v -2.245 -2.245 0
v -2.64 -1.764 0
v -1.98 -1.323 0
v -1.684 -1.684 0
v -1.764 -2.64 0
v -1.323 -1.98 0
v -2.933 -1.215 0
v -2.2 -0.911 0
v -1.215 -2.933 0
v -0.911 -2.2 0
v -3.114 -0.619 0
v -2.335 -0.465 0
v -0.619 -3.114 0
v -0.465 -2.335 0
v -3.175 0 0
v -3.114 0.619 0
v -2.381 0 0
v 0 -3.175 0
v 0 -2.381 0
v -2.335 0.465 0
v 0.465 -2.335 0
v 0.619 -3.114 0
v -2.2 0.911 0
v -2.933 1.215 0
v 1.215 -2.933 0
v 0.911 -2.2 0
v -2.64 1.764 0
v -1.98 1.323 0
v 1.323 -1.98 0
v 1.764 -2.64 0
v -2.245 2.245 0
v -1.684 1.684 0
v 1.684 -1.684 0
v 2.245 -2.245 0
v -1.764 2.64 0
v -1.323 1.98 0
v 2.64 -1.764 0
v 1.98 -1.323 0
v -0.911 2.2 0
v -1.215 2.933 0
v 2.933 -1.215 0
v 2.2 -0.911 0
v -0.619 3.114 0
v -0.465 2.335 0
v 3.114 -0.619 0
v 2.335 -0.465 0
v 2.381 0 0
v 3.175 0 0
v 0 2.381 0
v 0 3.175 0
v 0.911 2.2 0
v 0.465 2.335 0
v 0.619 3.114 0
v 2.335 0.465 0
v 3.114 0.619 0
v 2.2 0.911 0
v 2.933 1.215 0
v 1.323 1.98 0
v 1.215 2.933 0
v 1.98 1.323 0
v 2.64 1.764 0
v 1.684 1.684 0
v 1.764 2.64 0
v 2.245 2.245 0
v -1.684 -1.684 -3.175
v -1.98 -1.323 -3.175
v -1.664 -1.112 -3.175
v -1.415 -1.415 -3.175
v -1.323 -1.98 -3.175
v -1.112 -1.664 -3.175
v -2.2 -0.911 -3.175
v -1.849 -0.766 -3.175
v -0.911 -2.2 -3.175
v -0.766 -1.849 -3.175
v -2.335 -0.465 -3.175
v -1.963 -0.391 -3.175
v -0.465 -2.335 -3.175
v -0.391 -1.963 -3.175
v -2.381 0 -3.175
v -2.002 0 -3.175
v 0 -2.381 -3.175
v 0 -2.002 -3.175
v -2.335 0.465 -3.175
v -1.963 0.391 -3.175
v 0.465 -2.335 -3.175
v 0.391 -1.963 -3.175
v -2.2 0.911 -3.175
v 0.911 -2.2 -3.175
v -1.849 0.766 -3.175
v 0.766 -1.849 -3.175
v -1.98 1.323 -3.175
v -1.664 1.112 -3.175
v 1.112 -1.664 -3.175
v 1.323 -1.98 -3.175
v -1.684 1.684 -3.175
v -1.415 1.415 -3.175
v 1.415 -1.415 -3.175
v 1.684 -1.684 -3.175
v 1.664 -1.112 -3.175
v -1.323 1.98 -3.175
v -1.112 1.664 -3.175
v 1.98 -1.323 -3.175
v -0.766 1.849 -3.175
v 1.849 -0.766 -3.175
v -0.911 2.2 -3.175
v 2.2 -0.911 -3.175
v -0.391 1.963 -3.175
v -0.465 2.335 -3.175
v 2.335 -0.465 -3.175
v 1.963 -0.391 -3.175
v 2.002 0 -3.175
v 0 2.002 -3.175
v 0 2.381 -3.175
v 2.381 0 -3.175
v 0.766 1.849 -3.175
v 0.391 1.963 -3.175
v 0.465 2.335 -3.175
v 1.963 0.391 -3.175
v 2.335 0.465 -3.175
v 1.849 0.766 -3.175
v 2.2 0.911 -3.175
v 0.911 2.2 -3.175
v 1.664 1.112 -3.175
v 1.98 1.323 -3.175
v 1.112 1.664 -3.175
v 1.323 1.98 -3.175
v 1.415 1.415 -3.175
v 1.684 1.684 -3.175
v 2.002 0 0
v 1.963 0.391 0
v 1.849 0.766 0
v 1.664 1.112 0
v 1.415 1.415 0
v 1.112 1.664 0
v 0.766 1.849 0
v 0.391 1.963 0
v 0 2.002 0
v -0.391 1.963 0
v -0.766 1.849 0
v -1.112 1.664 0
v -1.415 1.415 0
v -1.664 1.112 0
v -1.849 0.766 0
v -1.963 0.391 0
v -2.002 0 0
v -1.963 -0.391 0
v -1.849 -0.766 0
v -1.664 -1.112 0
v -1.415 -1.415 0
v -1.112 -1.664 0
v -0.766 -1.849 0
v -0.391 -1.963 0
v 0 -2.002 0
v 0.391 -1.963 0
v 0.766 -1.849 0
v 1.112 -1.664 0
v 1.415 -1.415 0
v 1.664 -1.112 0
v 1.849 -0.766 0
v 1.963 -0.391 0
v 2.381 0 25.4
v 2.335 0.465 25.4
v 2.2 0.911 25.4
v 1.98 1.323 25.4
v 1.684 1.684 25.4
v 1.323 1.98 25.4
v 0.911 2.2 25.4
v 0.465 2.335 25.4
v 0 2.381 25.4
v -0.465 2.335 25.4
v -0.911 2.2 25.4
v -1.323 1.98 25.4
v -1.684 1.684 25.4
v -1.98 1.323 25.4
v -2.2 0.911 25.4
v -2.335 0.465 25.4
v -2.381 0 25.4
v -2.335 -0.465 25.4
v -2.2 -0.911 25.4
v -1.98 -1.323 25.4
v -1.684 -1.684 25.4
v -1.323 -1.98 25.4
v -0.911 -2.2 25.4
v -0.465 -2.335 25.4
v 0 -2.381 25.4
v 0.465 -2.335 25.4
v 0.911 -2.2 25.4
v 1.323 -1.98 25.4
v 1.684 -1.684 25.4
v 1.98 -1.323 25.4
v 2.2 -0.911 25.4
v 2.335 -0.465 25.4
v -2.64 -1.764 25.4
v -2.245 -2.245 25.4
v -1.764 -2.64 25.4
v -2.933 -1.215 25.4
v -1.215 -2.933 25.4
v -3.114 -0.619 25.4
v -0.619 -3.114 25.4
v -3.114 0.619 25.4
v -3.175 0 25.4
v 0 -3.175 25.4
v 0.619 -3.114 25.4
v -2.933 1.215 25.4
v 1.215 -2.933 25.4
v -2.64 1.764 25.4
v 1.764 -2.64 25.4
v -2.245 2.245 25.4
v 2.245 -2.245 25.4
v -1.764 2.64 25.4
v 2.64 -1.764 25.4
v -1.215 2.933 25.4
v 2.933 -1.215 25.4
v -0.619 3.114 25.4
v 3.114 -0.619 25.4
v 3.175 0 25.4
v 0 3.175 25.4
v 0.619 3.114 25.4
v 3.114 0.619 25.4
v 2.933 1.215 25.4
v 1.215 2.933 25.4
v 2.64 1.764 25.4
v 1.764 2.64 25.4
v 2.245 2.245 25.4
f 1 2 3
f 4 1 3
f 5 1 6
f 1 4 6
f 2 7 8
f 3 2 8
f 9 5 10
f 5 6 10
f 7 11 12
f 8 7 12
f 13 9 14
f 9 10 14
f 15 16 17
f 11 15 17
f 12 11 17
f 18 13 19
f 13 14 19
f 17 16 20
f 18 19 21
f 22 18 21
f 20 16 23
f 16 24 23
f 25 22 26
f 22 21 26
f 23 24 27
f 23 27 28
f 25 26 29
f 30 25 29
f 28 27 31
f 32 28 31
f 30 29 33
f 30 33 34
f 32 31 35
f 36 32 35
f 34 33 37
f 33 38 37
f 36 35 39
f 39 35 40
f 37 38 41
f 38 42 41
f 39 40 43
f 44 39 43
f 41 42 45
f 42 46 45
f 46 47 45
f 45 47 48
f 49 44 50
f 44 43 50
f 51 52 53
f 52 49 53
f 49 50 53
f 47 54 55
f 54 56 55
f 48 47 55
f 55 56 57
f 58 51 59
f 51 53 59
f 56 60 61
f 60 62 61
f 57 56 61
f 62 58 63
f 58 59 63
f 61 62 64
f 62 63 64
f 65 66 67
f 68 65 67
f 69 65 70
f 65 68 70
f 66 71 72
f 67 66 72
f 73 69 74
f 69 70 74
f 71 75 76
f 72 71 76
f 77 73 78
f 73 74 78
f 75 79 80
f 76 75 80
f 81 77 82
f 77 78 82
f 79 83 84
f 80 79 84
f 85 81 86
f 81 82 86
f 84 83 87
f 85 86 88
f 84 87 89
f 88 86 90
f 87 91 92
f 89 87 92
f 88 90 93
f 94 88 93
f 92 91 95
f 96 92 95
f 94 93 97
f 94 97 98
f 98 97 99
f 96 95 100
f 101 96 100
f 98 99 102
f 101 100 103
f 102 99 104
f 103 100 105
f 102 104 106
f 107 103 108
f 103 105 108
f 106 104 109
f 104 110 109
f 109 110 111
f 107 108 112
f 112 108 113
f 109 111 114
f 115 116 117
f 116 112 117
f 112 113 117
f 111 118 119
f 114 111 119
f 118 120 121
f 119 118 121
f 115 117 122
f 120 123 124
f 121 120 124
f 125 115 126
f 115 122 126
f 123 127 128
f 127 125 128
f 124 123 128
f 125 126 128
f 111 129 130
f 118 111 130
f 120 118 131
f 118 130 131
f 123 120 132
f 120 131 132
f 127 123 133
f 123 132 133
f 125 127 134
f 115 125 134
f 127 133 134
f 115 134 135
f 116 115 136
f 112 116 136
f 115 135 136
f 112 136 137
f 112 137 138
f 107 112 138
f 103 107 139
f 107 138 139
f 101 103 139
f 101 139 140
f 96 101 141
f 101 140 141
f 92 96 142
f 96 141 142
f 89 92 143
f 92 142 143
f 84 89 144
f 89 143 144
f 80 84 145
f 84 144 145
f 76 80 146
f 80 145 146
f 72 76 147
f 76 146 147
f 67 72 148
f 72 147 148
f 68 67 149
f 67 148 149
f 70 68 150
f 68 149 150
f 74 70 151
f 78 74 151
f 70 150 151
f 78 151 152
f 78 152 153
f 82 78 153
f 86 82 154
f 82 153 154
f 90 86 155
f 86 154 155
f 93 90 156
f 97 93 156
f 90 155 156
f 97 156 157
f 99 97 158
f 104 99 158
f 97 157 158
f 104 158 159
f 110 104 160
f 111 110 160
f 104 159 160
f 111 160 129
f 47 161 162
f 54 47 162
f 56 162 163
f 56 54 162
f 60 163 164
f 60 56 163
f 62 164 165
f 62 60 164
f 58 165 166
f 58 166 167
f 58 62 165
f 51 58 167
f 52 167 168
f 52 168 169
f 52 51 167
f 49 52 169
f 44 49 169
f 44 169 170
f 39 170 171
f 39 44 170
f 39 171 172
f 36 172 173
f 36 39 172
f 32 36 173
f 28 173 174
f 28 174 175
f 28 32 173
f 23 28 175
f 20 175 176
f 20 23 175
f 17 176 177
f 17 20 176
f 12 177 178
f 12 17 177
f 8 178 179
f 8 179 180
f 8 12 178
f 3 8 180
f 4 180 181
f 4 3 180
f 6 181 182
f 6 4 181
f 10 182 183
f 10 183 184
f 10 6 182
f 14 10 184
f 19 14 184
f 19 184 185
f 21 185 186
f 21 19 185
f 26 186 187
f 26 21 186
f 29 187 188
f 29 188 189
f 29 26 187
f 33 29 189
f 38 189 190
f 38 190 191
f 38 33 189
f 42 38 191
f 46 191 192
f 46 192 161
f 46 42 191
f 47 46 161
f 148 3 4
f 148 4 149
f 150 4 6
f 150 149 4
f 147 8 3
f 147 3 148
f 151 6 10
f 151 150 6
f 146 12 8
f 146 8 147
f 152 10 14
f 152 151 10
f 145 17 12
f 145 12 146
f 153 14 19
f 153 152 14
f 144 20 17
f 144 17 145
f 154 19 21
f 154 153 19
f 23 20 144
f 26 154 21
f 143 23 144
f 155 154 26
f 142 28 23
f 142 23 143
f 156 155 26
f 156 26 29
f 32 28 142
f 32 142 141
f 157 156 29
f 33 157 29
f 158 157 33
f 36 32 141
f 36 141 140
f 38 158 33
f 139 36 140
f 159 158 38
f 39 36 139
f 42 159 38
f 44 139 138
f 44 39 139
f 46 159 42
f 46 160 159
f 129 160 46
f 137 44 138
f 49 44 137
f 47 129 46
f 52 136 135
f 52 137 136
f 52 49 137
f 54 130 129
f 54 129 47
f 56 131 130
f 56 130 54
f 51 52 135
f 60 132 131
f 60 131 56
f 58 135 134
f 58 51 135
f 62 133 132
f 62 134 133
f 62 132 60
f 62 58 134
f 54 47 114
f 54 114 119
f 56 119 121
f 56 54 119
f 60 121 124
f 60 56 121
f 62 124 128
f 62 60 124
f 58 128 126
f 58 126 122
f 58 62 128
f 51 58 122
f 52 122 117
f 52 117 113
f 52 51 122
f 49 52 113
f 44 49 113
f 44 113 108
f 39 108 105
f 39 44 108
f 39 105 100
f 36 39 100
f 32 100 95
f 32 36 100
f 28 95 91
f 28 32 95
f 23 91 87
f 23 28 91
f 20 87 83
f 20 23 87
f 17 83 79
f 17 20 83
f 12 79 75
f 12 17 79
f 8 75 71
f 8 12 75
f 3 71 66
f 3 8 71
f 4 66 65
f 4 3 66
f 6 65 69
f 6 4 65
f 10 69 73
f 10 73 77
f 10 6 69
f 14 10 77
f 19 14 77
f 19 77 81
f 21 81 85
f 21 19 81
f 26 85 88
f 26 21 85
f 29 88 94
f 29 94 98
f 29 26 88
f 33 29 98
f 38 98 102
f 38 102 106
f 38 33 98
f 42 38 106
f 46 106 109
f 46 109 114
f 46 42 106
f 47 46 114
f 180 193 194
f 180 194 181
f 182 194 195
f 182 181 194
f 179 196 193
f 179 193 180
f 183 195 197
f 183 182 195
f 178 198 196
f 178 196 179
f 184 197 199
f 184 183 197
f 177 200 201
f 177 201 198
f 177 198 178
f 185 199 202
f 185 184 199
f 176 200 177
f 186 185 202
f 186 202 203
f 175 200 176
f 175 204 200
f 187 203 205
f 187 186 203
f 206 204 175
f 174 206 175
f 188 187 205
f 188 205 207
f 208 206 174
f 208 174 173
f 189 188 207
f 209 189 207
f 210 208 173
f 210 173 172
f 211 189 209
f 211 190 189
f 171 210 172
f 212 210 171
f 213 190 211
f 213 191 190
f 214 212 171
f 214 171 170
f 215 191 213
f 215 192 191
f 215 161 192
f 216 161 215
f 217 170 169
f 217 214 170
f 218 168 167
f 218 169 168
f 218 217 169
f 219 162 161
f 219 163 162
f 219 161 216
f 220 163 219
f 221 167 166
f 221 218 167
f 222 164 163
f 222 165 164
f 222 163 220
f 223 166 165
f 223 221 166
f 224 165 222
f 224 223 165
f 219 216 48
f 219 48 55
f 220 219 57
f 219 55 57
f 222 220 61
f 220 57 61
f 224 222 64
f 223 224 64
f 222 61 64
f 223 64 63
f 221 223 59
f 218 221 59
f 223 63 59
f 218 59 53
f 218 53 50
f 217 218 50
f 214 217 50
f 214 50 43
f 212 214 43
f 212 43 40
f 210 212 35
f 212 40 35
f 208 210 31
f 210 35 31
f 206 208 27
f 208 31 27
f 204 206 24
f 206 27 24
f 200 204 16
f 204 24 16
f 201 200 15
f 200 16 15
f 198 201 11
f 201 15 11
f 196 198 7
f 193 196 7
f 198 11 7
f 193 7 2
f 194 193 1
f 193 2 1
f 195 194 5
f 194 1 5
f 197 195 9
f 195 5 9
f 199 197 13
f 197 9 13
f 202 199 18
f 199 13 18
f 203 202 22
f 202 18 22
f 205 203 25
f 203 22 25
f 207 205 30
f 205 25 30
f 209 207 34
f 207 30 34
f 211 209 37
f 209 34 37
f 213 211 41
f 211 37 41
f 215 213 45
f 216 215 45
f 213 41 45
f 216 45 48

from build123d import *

# Parameters (mm, degrees)
F0_R     = 3.175
F0_R_2   = 2.38125
F1_DEPTH = 25.4
F0_R_3   = 2.001721
F2_DEPTH = 3.175


with BuildPart() as f1:
    # F0 (on Top) → F1 (new body)
    with BuildSketch(Plane.XY):
        Circle(F0_R)
        Circle(F0_R_2, mode=Mode.SUBTRACT)
    extrude(amount=F1_DEPTH)


with BuildPart() as f2:
    # F0 (on Top) → F2 (new body)
    with BuildSketch(Plane.XY):
        Circle(F0_R_2)
        Circle(F0_R_3, mode=Mode.SUBTRACT)
    extrude(amount=-F2_DEPTH)


solid = Compound([f1.part, f2.part])
